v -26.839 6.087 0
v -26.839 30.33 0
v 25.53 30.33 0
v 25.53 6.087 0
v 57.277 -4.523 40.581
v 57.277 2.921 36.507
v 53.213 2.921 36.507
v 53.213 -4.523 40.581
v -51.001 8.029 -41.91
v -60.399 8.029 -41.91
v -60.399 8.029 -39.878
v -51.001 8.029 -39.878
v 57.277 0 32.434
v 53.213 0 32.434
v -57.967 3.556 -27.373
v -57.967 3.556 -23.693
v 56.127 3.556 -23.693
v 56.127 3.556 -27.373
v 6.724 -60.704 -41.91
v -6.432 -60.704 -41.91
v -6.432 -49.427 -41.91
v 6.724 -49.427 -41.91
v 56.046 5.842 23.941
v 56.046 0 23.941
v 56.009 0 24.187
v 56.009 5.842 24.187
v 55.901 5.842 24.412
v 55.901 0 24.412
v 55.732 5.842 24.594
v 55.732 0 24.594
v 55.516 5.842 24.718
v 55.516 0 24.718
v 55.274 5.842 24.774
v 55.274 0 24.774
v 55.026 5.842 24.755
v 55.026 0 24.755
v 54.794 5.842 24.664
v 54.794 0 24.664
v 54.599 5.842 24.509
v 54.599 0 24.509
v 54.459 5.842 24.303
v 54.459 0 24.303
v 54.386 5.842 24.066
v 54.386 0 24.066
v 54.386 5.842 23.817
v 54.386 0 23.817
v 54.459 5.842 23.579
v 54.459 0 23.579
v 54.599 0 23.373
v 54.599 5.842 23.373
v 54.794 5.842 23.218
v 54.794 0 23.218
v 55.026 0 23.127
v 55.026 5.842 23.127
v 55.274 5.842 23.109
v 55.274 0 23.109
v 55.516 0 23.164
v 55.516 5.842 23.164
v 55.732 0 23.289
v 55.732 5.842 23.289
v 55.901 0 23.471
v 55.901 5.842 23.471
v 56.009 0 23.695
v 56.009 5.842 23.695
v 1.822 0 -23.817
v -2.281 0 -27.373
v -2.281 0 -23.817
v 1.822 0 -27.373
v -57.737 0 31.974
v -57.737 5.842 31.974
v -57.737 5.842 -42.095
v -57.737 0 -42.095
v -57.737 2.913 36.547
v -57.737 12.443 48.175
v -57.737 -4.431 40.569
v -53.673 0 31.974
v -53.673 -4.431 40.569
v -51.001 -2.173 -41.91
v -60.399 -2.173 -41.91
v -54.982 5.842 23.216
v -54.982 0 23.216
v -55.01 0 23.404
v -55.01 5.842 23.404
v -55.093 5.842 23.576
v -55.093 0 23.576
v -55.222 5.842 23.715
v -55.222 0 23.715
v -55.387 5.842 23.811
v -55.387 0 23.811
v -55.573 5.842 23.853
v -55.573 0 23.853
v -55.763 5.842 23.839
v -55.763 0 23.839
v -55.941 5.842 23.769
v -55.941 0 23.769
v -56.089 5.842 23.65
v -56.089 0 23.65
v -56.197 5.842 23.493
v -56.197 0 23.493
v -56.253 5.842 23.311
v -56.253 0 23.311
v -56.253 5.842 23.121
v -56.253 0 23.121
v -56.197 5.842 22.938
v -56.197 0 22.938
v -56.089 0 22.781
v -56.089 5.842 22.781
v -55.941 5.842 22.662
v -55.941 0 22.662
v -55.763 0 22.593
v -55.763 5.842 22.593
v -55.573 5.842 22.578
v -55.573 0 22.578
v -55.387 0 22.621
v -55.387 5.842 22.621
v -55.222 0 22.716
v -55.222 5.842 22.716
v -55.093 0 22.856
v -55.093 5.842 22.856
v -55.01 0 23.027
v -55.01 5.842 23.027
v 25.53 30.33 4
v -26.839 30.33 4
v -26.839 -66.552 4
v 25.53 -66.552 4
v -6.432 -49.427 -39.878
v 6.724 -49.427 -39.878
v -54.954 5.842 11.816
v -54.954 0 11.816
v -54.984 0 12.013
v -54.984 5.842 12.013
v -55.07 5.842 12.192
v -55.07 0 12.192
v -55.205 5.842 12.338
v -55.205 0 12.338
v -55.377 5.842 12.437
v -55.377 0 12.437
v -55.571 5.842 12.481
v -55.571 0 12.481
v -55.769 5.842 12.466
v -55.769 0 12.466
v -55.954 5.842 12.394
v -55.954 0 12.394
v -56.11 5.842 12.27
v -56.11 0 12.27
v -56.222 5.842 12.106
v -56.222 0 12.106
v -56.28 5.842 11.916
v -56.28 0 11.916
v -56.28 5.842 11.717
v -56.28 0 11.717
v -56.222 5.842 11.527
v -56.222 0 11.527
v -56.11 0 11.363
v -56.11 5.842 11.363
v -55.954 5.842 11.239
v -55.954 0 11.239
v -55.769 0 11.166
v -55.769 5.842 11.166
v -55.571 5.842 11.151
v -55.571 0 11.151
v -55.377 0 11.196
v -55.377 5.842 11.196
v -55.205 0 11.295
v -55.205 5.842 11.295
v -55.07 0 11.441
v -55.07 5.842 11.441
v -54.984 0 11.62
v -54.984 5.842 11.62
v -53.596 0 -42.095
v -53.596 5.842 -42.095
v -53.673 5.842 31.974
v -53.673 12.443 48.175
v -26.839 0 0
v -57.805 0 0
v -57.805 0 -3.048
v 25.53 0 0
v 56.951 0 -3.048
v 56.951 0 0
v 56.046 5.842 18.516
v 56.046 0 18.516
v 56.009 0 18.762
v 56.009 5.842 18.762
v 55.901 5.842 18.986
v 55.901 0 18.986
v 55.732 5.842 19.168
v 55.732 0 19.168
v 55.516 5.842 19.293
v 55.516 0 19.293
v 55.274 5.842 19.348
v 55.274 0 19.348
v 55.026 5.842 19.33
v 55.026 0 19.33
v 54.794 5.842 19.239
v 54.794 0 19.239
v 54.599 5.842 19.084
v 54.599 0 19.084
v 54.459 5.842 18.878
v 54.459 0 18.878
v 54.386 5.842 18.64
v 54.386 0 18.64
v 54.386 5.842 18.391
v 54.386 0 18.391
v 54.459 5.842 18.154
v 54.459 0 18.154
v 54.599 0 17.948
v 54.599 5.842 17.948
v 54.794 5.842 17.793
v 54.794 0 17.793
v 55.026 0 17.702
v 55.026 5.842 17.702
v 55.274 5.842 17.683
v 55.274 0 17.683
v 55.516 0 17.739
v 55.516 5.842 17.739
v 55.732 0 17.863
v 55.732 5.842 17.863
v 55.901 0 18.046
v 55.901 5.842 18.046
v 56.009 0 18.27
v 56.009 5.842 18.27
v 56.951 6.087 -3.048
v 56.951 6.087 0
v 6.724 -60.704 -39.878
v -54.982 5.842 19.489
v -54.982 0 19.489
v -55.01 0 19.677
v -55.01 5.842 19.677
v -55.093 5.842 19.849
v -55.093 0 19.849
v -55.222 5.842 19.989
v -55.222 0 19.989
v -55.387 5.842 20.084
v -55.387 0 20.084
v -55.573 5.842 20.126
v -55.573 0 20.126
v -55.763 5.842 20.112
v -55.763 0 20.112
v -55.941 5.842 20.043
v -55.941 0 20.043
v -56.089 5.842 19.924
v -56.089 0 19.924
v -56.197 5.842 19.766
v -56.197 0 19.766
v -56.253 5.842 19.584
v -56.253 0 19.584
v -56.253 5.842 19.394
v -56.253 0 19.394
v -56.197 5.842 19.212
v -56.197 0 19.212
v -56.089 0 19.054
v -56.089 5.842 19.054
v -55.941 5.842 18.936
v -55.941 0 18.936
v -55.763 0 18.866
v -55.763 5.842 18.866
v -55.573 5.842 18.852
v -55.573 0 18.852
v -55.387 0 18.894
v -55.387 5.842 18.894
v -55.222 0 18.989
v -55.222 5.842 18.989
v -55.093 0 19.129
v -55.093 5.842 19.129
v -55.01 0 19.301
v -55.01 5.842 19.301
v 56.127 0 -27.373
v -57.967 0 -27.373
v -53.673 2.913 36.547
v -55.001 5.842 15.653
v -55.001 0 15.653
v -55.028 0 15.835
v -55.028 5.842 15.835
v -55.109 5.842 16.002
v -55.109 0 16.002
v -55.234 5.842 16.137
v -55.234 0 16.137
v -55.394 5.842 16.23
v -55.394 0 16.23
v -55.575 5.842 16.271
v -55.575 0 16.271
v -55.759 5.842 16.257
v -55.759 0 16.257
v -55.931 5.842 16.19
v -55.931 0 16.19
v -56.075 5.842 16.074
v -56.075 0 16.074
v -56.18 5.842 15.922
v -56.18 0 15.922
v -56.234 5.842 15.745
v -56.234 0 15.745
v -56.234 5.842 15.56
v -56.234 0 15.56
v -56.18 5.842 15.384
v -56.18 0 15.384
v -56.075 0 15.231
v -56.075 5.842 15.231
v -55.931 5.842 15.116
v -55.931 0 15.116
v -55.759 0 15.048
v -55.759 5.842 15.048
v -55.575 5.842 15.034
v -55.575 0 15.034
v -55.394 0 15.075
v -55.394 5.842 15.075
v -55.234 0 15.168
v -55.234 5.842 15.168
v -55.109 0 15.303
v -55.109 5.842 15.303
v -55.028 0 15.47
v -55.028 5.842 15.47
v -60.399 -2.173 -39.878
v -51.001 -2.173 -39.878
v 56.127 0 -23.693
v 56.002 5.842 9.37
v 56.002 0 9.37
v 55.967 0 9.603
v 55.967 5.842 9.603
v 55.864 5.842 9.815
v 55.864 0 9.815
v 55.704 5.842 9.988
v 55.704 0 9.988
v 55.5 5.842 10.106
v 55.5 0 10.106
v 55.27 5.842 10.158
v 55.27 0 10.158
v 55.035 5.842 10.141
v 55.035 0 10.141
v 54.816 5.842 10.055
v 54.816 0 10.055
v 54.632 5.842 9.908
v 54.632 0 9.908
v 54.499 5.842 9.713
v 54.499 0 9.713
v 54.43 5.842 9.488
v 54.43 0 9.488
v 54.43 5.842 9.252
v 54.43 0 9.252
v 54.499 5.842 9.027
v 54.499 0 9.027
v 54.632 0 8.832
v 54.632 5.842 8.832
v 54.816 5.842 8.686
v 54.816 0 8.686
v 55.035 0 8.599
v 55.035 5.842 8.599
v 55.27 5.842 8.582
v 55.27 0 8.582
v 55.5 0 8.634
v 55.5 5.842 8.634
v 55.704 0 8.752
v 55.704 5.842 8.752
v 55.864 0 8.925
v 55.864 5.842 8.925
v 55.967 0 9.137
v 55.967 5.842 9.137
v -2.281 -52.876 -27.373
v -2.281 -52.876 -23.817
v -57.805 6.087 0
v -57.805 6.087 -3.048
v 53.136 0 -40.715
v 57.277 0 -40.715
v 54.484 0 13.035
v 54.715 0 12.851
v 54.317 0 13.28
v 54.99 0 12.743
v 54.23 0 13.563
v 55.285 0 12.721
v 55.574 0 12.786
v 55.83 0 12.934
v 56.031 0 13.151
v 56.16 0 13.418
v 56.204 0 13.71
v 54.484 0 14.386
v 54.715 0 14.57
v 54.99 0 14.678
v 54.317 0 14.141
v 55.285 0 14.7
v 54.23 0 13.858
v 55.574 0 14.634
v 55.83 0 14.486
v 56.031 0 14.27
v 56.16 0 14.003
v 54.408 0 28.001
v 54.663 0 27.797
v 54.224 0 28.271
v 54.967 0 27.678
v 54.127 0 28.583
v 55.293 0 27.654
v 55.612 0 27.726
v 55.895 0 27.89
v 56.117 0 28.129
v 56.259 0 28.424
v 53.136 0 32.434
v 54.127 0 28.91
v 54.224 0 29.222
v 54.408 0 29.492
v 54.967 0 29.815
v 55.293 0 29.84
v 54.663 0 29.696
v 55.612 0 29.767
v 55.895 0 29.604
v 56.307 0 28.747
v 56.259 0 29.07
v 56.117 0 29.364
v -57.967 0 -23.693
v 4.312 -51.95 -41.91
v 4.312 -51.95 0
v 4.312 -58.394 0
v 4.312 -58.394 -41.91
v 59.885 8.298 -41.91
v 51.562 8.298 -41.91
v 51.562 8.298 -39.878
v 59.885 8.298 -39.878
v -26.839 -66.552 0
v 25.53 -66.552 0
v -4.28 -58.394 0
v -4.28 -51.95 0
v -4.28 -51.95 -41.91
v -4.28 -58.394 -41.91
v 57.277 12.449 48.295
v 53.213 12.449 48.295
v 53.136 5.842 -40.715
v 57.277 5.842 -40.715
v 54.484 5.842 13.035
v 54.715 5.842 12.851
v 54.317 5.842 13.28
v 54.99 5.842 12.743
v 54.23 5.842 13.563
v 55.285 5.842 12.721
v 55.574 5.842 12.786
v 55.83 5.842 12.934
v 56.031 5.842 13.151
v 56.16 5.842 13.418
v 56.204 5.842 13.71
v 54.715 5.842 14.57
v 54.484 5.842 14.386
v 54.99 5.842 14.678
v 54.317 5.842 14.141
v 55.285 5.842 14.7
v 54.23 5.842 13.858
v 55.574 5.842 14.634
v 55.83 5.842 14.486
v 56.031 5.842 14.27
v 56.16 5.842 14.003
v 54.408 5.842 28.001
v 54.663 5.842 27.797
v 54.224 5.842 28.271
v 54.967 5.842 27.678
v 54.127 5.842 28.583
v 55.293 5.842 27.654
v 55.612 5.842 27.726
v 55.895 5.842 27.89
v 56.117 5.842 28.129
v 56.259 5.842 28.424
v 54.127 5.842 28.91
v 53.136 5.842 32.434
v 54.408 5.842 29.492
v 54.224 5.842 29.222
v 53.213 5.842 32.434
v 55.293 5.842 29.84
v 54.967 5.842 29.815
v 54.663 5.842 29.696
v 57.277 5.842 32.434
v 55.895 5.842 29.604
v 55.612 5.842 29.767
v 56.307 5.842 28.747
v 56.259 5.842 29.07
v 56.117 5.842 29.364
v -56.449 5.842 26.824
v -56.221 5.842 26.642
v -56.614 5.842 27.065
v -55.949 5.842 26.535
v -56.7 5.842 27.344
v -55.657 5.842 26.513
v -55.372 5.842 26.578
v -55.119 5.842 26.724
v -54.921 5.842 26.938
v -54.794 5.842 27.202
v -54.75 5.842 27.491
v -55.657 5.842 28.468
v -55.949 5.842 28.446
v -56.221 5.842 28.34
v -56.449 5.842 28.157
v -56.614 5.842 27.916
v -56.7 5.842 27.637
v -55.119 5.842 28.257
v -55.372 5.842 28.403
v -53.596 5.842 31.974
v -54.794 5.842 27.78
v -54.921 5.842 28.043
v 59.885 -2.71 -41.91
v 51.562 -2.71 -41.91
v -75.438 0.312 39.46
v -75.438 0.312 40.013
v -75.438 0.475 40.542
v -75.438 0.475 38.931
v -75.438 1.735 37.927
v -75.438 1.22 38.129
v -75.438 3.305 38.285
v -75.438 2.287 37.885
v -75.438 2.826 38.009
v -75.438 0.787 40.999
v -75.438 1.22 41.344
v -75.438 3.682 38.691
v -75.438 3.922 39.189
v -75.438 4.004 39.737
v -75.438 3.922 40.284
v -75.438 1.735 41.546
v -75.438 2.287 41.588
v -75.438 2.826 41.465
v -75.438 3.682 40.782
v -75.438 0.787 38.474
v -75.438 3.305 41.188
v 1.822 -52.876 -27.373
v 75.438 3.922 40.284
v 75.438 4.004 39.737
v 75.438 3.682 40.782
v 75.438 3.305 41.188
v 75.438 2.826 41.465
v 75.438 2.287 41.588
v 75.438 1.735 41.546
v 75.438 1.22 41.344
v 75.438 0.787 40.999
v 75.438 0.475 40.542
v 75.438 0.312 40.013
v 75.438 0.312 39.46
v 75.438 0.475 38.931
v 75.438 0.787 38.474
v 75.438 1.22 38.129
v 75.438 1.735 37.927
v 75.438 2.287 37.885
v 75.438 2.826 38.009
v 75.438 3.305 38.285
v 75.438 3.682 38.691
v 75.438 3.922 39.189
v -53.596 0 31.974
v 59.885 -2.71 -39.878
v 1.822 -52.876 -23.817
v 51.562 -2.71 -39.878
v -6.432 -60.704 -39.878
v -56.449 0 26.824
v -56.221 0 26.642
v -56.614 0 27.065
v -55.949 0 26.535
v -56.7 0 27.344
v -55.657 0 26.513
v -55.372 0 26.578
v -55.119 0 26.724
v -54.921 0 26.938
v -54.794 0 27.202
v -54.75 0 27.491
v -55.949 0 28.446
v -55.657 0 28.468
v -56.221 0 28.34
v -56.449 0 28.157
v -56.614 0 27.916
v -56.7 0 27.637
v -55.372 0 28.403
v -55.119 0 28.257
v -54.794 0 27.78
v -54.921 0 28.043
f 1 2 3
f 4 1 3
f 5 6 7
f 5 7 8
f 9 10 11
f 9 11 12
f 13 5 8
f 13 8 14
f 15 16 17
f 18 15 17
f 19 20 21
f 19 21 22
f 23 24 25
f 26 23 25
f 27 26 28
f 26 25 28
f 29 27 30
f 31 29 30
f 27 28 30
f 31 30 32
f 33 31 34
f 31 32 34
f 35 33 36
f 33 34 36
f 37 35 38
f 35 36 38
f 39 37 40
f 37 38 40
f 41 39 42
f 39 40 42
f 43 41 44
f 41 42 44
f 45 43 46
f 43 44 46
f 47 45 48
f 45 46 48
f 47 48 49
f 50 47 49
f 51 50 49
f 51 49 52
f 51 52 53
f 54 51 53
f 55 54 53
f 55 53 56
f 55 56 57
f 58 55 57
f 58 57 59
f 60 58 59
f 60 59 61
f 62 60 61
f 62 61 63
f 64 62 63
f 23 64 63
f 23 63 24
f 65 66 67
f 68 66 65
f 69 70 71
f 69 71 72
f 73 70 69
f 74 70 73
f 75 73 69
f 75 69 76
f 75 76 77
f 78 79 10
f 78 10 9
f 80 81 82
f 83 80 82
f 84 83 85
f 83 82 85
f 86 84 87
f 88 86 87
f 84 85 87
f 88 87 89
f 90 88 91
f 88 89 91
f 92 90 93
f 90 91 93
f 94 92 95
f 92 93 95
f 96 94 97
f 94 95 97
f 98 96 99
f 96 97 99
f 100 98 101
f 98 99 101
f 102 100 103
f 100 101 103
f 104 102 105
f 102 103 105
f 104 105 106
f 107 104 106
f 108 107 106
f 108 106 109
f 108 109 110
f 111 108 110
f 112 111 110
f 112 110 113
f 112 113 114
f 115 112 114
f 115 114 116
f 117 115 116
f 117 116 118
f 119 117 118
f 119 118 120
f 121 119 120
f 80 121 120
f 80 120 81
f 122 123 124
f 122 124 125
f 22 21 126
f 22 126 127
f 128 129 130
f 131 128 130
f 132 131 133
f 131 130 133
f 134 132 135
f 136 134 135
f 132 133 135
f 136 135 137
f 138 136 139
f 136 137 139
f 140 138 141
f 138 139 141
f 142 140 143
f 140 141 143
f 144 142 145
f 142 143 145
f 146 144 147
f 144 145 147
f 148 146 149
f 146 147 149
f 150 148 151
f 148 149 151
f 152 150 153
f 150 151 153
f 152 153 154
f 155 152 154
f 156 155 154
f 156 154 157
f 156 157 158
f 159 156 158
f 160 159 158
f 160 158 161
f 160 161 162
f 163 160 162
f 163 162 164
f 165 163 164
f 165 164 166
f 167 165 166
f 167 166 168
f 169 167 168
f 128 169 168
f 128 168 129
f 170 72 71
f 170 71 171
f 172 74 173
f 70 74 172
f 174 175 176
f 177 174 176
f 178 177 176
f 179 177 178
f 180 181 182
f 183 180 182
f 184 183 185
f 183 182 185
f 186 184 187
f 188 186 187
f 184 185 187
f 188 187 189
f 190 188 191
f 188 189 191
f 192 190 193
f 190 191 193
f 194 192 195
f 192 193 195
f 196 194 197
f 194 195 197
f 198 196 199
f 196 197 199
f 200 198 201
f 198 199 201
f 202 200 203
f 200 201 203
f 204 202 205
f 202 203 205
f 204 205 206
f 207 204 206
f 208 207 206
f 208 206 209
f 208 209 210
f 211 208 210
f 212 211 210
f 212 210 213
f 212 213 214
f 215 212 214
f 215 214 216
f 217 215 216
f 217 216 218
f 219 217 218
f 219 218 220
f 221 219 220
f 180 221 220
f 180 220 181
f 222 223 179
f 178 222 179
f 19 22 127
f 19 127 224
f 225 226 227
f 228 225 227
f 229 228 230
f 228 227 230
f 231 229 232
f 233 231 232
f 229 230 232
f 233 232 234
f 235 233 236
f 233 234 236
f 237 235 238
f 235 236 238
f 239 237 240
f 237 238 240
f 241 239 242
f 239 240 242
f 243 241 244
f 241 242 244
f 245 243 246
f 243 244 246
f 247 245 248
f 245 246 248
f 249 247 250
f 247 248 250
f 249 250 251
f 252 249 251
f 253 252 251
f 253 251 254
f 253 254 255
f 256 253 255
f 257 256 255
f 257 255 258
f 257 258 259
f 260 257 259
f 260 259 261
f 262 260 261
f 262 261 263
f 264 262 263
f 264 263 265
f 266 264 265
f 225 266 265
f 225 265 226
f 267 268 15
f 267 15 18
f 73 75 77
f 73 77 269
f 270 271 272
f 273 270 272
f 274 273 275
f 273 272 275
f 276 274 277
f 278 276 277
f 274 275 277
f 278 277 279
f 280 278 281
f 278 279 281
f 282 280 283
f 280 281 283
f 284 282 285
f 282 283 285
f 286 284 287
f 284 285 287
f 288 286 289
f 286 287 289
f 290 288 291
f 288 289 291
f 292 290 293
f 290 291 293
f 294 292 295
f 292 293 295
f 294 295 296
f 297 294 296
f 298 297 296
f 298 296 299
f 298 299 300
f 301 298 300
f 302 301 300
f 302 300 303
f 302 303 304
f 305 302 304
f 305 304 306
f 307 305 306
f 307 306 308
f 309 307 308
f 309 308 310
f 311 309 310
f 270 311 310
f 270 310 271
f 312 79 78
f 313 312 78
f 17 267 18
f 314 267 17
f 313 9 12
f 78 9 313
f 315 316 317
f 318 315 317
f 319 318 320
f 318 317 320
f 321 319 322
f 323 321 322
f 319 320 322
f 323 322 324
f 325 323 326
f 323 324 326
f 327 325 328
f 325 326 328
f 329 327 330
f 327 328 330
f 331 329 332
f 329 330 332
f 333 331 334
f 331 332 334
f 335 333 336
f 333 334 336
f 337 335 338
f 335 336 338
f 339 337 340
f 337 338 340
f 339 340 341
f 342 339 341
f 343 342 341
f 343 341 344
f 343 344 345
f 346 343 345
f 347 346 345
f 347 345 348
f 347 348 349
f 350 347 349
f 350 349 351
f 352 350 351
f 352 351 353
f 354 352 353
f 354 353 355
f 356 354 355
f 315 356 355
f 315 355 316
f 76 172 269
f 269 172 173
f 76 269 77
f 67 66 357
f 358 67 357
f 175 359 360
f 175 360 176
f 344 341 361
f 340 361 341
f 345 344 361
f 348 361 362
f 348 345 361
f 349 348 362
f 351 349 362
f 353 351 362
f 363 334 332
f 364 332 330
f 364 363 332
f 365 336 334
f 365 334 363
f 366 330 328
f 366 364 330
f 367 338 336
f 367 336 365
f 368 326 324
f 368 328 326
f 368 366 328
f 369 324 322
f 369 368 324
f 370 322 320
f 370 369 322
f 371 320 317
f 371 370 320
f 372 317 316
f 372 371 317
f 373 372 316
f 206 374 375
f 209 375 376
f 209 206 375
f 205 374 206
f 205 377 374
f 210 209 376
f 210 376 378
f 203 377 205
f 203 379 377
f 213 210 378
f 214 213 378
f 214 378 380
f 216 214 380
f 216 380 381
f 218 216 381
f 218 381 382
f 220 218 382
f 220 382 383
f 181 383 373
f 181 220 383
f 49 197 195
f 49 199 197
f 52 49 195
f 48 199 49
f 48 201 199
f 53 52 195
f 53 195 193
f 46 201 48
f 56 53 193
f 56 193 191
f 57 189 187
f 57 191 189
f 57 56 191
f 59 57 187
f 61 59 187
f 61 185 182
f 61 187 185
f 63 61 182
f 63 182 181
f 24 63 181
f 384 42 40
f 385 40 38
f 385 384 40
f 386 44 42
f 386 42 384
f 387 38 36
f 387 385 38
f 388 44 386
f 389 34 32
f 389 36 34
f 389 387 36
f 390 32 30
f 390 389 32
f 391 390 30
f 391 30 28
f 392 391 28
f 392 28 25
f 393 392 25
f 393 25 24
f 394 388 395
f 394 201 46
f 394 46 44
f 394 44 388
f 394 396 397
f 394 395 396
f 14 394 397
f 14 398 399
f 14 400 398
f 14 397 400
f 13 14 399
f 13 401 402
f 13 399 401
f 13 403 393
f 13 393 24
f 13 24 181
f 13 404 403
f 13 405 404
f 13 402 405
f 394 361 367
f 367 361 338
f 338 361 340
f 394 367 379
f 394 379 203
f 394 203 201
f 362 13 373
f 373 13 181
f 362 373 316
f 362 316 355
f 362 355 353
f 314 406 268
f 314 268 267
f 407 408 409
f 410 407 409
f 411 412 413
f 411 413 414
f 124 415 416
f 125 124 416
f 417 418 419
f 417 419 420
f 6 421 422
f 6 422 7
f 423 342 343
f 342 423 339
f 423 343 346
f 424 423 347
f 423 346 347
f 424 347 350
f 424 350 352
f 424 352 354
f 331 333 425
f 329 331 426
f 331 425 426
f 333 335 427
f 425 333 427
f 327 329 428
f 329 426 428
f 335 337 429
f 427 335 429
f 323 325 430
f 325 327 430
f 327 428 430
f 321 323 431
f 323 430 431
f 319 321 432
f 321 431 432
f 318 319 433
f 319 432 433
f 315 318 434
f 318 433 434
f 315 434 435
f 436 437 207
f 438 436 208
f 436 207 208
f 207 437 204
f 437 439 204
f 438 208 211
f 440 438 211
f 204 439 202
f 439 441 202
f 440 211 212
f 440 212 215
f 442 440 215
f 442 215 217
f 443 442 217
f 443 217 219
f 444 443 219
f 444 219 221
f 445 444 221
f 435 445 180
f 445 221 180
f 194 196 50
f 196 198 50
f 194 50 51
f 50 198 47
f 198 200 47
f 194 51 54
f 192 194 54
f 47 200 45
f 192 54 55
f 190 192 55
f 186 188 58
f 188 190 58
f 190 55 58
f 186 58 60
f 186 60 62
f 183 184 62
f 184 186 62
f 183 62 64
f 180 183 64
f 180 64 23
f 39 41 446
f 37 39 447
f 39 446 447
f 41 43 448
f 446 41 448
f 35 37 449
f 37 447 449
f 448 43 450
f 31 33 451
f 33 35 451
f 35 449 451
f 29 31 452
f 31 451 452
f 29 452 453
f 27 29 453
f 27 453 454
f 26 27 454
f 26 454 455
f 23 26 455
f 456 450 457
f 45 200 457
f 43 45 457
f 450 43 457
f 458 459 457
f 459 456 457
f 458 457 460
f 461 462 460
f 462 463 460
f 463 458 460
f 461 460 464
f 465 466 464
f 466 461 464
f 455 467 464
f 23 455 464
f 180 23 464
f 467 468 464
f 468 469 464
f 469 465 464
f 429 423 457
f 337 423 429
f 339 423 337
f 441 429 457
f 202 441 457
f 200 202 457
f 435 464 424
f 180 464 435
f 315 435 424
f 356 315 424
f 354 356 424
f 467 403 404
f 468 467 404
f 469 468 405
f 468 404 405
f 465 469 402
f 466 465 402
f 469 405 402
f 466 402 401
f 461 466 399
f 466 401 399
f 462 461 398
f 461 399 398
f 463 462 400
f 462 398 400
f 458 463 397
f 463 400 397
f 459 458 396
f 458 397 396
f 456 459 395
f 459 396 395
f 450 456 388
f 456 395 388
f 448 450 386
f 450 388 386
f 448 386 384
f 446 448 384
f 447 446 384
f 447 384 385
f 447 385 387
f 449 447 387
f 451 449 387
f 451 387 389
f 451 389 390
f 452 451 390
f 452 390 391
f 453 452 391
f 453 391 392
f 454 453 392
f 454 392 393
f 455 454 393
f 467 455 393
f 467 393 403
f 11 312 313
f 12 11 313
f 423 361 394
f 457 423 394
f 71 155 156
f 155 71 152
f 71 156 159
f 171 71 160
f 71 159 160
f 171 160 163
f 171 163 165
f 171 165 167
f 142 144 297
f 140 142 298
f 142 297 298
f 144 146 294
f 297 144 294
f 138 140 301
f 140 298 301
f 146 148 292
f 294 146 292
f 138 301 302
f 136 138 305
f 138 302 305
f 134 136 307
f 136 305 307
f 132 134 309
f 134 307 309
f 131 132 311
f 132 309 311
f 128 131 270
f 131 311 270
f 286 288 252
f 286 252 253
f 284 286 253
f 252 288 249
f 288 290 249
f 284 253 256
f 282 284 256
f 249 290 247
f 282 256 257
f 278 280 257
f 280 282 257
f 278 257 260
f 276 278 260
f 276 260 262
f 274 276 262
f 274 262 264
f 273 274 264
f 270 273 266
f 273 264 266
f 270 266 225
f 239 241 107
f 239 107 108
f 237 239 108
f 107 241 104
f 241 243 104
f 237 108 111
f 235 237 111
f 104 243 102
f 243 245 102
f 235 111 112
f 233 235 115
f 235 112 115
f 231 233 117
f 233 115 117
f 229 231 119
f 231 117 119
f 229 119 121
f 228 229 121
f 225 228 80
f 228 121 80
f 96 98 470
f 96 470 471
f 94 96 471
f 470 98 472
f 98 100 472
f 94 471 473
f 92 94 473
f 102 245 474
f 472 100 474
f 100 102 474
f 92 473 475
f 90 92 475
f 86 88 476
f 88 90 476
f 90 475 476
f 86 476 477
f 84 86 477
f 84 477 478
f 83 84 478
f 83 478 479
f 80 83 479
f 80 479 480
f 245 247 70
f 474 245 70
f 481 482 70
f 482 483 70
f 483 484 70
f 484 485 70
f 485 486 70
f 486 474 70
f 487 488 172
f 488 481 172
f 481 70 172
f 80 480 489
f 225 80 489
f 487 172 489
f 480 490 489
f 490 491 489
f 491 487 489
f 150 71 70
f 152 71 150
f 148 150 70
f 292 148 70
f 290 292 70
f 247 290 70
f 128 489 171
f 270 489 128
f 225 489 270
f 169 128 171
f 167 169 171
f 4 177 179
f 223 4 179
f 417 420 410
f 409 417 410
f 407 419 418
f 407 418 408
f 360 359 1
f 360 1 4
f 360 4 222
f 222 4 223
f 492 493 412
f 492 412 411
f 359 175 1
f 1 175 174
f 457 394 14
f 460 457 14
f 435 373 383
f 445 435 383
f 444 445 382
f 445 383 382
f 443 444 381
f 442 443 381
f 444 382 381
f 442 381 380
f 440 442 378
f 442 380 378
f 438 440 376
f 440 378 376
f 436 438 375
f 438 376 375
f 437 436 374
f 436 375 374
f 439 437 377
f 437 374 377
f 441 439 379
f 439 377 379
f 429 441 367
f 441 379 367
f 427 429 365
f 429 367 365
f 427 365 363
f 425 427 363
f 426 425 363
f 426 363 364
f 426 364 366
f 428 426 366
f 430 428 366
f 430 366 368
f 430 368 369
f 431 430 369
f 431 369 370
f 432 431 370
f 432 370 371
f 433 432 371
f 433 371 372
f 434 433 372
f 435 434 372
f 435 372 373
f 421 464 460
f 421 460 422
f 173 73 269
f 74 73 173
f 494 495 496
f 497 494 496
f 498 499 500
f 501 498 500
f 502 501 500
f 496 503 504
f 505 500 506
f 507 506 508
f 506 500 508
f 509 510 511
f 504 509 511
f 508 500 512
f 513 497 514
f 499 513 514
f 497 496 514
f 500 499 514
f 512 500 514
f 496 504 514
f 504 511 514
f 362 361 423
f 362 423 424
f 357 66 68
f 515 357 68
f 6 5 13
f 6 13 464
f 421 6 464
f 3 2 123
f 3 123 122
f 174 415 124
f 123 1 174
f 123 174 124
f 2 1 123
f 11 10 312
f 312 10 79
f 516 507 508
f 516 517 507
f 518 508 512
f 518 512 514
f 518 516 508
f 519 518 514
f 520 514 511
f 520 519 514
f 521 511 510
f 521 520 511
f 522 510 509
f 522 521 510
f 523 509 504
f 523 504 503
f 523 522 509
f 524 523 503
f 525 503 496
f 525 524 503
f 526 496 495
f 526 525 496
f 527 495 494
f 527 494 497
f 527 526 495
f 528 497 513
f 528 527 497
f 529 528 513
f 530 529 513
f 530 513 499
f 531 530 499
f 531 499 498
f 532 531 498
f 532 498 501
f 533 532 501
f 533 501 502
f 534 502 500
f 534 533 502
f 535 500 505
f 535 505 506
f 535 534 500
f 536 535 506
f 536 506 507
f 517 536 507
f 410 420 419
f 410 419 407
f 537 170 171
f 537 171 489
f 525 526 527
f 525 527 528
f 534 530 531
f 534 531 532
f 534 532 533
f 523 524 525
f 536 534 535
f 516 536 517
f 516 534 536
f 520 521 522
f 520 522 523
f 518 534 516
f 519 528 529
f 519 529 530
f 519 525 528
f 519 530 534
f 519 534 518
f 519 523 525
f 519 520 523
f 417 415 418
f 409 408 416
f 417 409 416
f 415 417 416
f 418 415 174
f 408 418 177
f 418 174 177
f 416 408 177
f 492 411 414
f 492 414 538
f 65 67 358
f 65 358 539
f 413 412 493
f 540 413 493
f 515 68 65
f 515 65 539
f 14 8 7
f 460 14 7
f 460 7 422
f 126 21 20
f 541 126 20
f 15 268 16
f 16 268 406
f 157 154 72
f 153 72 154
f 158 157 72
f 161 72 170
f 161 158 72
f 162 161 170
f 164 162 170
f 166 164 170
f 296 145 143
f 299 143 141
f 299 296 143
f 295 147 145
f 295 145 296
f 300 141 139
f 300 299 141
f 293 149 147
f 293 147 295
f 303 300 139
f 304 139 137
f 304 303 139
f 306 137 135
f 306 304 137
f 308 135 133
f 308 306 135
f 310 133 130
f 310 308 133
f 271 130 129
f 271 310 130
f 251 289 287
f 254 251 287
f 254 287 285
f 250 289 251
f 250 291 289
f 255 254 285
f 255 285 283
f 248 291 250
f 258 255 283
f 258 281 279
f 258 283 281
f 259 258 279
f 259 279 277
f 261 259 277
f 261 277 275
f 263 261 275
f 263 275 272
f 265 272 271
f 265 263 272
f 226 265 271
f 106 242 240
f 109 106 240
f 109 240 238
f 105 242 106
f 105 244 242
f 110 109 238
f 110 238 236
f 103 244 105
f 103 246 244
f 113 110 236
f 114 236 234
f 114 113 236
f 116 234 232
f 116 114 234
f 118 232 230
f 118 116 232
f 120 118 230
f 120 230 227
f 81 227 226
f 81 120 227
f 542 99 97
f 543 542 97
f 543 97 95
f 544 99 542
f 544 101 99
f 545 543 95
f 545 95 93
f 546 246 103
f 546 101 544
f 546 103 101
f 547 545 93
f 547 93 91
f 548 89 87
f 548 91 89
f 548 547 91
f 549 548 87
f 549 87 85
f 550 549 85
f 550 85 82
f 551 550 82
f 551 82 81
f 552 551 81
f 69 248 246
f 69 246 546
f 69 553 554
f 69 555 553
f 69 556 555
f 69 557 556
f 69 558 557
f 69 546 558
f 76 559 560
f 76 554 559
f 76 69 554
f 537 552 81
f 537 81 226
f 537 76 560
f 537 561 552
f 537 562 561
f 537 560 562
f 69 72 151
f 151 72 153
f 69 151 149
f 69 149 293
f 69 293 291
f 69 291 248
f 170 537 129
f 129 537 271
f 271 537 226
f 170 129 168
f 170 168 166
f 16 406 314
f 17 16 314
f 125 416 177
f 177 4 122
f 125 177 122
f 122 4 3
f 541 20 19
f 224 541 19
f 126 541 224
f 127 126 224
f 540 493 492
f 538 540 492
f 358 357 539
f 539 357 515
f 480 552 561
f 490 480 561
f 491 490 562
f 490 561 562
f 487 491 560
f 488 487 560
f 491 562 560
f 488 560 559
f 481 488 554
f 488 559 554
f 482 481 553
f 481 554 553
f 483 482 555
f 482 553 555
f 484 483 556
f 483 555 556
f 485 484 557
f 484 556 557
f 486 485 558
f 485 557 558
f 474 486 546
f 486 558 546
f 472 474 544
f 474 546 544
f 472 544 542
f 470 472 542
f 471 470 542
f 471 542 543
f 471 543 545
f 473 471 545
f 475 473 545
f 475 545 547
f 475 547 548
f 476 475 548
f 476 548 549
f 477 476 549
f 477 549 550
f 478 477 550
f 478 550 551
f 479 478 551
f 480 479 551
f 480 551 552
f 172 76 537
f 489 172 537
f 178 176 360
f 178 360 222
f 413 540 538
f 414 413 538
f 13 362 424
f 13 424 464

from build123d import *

# Parameters (mm, degrees)
F0_W      = 52.368403
F0_H      = 96.881537
F1_DEPTH  = 4
F2_W      = 114.755187
F2_H      = 6.086928
F3_DEPTH  = 3.048
F4_W      = 8.591679
F4_H      = 6.443758
F5_DEPTH  = 41.91
F6_W      = 114.093784
F6_H      = 3.680445
F7_DEPTH  = 3.556
F8_W      = 4.140499
F8_H      = 73.14884
F8_W_2    = 4.1405
F8_H_2    = 74.068949
F9_DEPTH  = 5.842
F10_W     = 4.10326
F10_H     = 52.87635
F11_DEPTH = 3.556
F13_DEPTH = 4.064
F15_DEPTH = 4.064
F16_R     = 0.980386
F16_R_2   = 0.639131
F16_R_3   = 0.639132
F16_R_4   = 0.62005
F16_R_5   = 0.666735
F17_DEPTH = 25.4
F18_R     = 1.096107
F18_R_2   = 0.834771
F18_R_3   = 0.992567
F18_R_4   = 0.790414
F19_DEPTH = 25.4
F20_W     = 13.156006
F20_H     = 11.276576
F20_W_2   = 9.397149
F20_H_2   = 10.202618
F20_W_3   = 8.323186
F20_H_3   = 11.008088
F21_DEPTH = 2.032
F22_R     = 1.85633
F23_DEPTH = 75.438


with BuildPart() as f1:
    # F0 (on Top) → F1 (new body)
    with BuildSketch(Plane.XY):
        with Locations((-0.654604, -18.110739)):
            Rectangle(F0_W, F0_H)
    extrude(amount=F1_DEPTH)

    # F2 (on face) → F3 (join)
    with BuildSketch(Plane(origin=(0, 0, 0), x_dir=(1, 0, 0), z_dir=(0, 0, -1))):
        with Locations((-0.426962, -3.043464)):
            Rectangle(F2_W, F2_H)
    extrude(amount=F3_DEPTH)

    # F4 (on face) → F5 (join)
    with BuildSketch(Plane(origin=(0, 0, 0), x_dir=(1, 0, 0), z_dir=(0, 0, -1))):
        with Locations((0.015967, 55.172136)):
            Rectangle(F4_W, F4_H)
    extrude(amount=F5_DEPTH)


with BuildPart() as f7:
    # F6 (on Front) → F7 (new body)
    with BuildSketch(Plane.XZ):
        with Locations((-0.920111, -25.533088)):
            Rectangle(F6_W, F6_H)
    extrude(amount=-F7_DEPTH)


with BuildPart() as f9:
    # F8 (on Front) → F9 (new body)
    with BuildSketch(Plane.XZ):
        with Locations((55.20667, -4.1405)):
            Rectangle(F8_W, F8_H)
        with Locations((-55.666724, -5.060609)):
            Rectangle(F8_W_2, F8_H_2)
    extrude(amount=-F9_DEPTH)

    # F12 (on face) → F13 (join)
    with BuildSketch(Plane.YZ.offset(57.276919)):
        Polygon((-4.523055, 40.580641), (0, 32.43392), (5.842, 32.43392), (12.449046, 48.295233), (2.921, 36.507281), align=None)
    extrude(amount=-F13_DEPTH)

    # F14 (on face) → F15 (join)
    with BuildSketch(Plane(origin=(-57.736974, 0, 0), x_dir=(0, -1, 0), z_dir=(-1, 0, 0))):
        Polygon((-12.443231, 48.175279), (-5.842, 31.973865), (0, 31.973865), (4.431231, 40.568657), (-2.913094, 36.546763), align=None)
    extrude(amount=-F15_DEPTH)

    # F16 (on face) → F17 (cut)
    with BuildSketch(Plane.XZ):
        with Locations((-55.730559, 27.490592)):
            Circle(F16_R)
        with Locations((-55.620946, 23.21578)):
            Circle(F16_R_2)
        with Locations((-55.620946, 19.48902)):
            Circle(F16_R_3)
        with Locations((-55.620946, 15.652651)):
            Circle(F16_R_4)
        with Locations((-55.620946, 11.816282)):
            Circle(F16_R_5)
    extrude(amount=-F17_DEPTH, mode=Mode.SUBTRACT)

    # F18 (on face) → F19 (cut)
    with BuildSketch(Plane.XZ):
        with Locations((55.211324, 28.746681)):
            Circle(F18_R)
        with Locations((55.211324, 23.941286)):
            Circle(F18_R_2)
        with Locations((55.211324, 18.51584)):
            Circle(F18_R_2)
        with Locations((55.211324, 13.710445)):
            Circle(F18_R_3)
        with Locations((55.211324, 9.37009)):
            Circle(F18_R_4)
    extrude(amount=-F19_DEPTH, mode=Mode.SUBTRACT)


with BuildPart() as f11:
    # F10 (on face) → F11 (new body)
    with BuildSketch(Plane(origin=(0, 0, -27.37331), x_dir=(1, 0, 0), z_dir=(0, 0, -1))):
        with Locations((-0.229647, 26.438175)):
            Rectangle(F10_W, F10_H)
    extrude(amount=-F11_DEPTH)


with BuildPart() as f21:
    # F20 (on face) → F21 (new body)
    with BuildSketch(Plane(origin=(0, 0, -41.91), x_dir=(1, 0, 0), z_dir=(0, 0, -1))):
        with Locations((0.145966, 55.065697)):
            Rectangle(F20_W, F20_H)
        with Locations((-55.69994, -2.92813)):
            Rectangle(F20_W_2, F20_H_2)
        with Locations((55.723384, -2.793885)):
            Rectangle(F20_W_3, F20_H_3)
    extrude(amount=-F21_DEPTH)


with BuildPart() as f23:
    # F22 (on Right) → F23 (new body, symmetric)
    with BuildSketch(Plane.YZ):
        with Locations((2.147918, 39.736513)):
            Circle(F22_R)
    extrude(amount=F23_DEPTH, both=True)


solid = Compound([f1.part, f7.part, f9.part, f11.part, f21.part, f23.part])
